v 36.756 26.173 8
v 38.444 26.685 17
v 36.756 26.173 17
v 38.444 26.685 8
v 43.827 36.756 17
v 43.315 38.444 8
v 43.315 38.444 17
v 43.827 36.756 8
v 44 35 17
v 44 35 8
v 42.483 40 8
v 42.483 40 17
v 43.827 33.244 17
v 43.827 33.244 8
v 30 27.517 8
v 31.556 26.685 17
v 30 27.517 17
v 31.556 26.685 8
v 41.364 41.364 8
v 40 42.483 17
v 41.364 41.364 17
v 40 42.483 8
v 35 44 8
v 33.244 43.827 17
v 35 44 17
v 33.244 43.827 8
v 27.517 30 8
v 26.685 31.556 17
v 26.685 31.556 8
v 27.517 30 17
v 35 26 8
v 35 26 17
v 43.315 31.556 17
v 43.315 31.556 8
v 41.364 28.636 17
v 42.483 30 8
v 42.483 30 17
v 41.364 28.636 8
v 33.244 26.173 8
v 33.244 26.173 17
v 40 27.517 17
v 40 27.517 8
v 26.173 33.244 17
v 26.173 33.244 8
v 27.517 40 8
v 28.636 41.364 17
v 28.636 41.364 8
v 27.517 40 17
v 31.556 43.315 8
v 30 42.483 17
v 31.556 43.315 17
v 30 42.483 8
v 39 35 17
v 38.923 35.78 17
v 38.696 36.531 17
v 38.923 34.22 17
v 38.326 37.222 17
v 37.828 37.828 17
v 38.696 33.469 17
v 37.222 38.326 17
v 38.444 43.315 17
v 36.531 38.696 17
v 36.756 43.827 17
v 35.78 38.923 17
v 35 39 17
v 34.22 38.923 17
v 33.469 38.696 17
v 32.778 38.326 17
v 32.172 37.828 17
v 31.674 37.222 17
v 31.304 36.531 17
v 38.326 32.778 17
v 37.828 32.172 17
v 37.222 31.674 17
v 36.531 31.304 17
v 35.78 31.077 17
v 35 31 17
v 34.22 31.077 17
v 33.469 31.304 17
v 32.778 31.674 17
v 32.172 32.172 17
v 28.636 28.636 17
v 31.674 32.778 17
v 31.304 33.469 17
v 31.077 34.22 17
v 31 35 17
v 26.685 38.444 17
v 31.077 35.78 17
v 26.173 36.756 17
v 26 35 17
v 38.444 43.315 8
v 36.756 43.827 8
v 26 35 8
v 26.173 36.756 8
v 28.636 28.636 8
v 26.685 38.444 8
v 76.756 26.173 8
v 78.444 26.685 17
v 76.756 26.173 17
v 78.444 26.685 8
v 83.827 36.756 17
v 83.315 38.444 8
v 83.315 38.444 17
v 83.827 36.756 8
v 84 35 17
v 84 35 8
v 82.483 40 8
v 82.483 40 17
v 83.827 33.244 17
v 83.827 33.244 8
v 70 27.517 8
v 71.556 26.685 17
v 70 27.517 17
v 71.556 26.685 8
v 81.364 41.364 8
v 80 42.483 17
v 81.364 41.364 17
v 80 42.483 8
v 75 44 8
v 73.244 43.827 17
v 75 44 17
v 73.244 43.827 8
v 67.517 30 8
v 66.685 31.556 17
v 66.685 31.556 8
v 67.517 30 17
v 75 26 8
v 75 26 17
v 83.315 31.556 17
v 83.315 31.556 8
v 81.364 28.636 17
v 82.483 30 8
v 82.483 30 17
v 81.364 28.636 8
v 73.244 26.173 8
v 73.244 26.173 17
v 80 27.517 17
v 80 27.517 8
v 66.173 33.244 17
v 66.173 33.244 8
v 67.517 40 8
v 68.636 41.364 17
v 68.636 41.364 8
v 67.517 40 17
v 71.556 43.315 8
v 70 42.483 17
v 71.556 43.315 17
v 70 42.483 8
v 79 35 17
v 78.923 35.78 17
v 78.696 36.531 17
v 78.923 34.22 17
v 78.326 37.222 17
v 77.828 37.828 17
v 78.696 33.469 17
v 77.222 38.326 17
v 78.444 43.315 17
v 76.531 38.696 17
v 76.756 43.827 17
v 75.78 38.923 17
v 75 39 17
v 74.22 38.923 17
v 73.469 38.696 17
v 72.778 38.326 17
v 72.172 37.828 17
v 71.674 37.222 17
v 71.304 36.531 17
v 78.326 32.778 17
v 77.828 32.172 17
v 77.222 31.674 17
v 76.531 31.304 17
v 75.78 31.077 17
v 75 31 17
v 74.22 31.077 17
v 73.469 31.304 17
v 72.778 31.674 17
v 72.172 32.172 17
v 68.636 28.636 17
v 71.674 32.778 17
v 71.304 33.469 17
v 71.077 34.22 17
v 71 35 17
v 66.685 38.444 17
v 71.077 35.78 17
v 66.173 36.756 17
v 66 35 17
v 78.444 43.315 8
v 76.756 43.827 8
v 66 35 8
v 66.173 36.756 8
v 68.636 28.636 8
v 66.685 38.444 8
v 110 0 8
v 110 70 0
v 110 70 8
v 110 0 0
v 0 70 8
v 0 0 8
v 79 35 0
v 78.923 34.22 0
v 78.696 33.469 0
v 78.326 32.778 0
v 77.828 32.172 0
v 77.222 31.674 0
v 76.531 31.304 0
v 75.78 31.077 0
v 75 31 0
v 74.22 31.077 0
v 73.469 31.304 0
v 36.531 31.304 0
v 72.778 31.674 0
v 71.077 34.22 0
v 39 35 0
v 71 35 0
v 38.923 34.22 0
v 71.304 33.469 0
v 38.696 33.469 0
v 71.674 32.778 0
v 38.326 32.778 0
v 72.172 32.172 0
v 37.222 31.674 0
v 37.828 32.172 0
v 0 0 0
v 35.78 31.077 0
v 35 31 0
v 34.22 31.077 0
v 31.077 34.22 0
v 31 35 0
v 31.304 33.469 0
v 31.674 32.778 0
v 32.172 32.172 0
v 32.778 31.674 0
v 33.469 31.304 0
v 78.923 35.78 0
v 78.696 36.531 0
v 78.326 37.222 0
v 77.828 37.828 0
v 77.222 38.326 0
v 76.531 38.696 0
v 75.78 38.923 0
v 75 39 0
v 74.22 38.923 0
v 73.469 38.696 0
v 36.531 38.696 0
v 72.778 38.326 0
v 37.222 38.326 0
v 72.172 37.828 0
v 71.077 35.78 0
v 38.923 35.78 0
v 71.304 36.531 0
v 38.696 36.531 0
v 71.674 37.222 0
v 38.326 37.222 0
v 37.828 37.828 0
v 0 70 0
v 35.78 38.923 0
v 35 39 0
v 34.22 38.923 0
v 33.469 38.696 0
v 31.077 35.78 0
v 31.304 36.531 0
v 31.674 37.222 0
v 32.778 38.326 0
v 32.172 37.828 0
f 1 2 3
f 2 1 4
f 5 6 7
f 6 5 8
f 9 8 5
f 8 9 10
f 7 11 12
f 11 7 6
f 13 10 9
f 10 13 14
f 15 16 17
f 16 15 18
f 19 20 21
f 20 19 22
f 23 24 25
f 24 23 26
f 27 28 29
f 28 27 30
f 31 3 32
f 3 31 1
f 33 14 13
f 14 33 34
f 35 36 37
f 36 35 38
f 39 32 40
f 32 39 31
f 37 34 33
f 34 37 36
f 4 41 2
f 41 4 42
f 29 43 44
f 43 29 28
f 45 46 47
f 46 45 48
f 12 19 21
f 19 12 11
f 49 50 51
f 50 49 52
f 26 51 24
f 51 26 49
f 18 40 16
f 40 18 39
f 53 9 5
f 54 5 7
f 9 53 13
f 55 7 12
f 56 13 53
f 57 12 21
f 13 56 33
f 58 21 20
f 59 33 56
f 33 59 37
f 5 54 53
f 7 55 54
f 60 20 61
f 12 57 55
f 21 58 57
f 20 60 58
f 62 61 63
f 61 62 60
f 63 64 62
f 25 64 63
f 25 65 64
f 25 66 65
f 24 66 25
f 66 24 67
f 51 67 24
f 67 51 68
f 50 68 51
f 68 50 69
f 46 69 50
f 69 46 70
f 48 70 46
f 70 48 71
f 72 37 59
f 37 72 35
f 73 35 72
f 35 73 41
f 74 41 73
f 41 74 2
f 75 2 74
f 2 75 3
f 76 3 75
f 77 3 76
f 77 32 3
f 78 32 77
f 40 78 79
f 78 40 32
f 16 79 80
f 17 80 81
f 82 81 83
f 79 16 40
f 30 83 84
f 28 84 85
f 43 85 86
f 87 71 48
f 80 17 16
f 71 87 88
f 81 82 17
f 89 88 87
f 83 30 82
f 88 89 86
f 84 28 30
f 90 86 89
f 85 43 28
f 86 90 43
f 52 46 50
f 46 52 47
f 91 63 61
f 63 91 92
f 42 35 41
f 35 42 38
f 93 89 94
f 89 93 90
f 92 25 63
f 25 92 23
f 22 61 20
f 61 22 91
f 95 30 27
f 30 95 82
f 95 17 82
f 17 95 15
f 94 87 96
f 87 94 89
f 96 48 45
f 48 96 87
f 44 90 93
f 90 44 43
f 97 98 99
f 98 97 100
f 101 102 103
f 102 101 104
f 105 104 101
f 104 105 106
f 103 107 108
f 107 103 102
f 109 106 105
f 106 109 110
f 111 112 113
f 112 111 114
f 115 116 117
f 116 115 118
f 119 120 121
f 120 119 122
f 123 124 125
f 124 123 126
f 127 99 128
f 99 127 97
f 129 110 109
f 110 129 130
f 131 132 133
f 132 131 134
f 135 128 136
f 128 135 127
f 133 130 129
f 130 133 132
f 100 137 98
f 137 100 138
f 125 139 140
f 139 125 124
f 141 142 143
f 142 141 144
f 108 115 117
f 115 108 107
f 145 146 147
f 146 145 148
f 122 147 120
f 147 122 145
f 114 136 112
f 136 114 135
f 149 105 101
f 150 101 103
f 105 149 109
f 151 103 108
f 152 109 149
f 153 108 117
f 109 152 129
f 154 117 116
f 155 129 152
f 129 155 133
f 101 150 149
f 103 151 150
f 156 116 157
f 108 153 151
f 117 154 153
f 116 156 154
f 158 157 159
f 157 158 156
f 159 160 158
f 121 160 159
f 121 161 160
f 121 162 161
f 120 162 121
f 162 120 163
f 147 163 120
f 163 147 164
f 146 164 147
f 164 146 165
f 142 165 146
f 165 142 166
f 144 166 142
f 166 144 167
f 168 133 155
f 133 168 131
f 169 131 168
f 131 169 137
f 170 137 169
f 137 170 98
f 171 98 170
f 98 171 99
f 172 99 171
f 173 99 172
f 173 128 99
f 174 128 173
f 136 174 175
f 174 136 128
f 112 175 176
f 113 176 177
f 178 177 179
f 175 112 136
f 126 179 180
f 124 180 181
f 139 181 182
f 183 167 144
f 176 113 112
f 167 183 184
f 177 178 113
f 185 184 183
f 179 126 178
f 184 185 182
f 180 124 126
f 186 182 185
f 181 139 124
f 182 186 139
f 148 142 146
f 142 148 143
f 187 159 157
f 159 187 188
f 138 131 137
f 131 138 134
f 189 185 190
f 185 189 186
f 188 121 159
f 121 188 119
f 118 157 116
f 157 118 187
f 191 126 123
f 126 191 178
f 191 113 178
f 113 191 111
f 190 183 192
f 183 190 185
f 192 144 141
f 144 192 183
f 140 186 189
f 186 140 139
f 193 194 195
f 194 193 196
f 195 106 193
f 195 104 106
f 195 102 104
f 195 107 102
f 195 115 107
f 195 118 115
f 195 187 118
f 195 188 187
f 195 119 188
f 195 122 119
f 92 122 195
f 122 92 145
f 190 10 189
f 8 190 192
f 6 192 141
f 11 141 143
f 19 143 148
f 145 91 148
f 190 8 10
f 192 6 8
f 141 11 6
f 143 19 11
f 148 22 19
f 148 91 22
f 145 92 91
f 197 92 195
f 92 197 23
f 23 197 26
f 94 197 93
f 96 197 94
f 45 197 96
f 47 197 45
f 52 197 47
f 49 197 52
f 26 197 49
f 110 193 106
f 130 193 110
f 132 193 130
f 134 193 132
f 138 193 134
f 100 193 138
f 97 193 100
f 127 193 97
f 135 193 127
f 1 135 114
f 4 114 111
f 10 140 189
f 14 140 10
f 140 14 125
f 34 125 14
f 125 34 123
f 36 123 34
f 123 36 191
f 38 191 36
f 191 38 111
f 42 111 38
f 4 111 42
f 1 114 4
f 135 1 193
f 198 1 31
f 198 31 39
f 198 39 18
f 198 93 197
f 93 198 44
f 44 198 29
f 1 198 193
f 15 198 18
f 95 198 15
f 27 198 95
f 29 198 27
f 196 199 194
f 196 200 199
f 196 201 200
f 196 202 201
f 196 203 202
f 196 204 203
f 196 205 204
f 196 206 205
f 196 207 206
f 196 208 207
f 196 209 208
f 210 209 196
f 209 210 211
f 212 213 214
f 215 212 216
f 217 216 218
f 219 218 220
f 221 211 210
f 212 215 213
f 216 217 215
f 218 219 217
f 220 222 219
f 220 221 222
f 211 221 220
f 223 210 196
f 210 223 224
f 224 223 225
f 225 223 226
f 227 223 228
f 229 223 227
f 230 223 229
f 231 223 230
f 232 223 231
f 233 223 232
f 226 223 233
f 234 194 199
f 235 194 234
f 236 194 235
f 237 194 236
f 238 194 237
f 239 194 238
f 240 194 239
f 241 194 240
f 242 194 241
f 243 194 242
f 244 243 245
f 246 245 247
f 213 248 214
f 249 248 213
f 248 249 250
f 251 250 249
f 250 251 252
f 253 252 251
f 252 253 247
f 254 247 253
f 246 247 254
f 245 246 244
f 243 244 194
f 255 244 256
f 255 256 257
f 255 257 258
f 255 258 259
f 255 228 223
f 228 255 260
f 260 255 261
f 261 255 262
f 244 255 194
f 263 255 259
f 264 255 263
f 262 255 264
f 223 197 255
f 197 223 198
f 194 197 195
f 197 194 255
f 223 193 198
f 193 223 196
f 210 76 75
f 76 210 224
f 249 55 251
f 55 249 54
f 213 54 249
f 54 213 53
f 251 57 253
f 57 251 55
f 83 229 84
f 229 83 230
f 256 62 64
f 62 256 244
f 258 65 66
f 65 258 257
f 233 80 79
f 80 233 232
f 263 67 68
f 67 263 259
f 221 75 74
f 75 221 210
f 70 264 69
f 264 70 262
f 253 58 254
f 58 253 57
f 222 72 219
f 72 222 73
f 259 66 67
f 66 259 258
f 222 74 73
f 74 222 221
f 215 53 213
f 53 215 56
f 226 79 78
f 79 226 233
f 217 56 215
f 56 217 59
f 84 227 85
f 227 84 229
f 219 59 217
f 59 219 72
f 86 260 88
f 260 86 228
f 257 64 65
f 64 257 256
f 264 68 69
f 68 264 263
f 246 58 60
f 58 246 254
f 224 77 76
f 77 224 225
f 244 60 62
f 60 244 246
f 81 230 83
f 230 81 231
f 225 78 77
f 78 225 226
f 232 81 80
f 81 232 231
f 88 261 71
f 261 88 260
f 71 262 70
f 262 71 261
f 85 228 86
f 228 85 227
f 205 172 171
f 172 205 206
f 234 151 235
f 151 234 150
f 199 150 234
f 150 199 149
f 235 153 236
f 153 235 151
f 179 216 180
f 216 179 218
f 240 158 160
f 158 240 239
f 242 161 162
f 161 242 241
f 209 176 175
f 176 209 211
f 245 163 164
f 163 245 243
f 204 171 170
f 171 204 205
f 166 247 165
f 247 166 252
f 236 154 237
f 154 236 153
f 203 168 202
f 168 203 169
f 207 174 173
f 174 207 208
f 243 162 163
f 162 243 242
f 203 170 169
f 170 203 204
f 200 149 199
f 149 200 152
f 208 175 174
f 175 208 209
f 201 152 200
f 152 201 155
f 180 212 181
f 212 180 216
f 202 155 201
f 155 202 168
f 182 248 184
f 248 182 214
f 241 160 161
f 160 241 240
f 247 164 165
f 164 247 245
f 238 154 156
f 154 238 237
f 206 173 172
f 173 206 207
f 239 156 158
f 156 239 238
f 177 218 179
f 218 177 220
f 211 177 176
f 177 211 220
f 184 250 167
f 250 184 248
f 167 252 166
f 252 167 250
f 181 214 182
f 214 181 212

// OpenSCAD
$fn = 32;

// ----------------------------------------------------------------------
// Drill jig: two_boss jig
// ----------------------------------------------------------------------

// --- parameters (mm) ---
plate_l = 110;            // plate length, X
plate_w = 70;             // plate width, Y
plate_t = 8;              // plate thickness
boss_d = 18;              // guide boss diameter
boss_h = 10;              // boss height above the plate
guide_d = 8;              // guide hole diameter
boss_pitch = 40;          // boss pitch

n_boss = 2;  // guide bosses
boss_x0 = (plate_l - (n_boss - 1) * boss_pitch) / 2;  // first boss X
boss_top = plate_t - 1 + boss_h;  // boss crown height
total_h = boss_top;  // overall height

difference() {
  union() {
  cube([plate_l, plate_w, plate_t]);
  for (i = [0 : n_boss - 1])
    translate([boss_x0 + i * boss_pitch, plate_w / 2, plate_t - 1])
      cylinder(h = boss_h, d = boss_d);
  }
  for (i = [0 : n_boss - 1])
    translate([boss_x0 + i * boss_pitch, plate_w / 2, -1])
      cylinder(h = plate_t + boss_h, d = guide_d);
}
